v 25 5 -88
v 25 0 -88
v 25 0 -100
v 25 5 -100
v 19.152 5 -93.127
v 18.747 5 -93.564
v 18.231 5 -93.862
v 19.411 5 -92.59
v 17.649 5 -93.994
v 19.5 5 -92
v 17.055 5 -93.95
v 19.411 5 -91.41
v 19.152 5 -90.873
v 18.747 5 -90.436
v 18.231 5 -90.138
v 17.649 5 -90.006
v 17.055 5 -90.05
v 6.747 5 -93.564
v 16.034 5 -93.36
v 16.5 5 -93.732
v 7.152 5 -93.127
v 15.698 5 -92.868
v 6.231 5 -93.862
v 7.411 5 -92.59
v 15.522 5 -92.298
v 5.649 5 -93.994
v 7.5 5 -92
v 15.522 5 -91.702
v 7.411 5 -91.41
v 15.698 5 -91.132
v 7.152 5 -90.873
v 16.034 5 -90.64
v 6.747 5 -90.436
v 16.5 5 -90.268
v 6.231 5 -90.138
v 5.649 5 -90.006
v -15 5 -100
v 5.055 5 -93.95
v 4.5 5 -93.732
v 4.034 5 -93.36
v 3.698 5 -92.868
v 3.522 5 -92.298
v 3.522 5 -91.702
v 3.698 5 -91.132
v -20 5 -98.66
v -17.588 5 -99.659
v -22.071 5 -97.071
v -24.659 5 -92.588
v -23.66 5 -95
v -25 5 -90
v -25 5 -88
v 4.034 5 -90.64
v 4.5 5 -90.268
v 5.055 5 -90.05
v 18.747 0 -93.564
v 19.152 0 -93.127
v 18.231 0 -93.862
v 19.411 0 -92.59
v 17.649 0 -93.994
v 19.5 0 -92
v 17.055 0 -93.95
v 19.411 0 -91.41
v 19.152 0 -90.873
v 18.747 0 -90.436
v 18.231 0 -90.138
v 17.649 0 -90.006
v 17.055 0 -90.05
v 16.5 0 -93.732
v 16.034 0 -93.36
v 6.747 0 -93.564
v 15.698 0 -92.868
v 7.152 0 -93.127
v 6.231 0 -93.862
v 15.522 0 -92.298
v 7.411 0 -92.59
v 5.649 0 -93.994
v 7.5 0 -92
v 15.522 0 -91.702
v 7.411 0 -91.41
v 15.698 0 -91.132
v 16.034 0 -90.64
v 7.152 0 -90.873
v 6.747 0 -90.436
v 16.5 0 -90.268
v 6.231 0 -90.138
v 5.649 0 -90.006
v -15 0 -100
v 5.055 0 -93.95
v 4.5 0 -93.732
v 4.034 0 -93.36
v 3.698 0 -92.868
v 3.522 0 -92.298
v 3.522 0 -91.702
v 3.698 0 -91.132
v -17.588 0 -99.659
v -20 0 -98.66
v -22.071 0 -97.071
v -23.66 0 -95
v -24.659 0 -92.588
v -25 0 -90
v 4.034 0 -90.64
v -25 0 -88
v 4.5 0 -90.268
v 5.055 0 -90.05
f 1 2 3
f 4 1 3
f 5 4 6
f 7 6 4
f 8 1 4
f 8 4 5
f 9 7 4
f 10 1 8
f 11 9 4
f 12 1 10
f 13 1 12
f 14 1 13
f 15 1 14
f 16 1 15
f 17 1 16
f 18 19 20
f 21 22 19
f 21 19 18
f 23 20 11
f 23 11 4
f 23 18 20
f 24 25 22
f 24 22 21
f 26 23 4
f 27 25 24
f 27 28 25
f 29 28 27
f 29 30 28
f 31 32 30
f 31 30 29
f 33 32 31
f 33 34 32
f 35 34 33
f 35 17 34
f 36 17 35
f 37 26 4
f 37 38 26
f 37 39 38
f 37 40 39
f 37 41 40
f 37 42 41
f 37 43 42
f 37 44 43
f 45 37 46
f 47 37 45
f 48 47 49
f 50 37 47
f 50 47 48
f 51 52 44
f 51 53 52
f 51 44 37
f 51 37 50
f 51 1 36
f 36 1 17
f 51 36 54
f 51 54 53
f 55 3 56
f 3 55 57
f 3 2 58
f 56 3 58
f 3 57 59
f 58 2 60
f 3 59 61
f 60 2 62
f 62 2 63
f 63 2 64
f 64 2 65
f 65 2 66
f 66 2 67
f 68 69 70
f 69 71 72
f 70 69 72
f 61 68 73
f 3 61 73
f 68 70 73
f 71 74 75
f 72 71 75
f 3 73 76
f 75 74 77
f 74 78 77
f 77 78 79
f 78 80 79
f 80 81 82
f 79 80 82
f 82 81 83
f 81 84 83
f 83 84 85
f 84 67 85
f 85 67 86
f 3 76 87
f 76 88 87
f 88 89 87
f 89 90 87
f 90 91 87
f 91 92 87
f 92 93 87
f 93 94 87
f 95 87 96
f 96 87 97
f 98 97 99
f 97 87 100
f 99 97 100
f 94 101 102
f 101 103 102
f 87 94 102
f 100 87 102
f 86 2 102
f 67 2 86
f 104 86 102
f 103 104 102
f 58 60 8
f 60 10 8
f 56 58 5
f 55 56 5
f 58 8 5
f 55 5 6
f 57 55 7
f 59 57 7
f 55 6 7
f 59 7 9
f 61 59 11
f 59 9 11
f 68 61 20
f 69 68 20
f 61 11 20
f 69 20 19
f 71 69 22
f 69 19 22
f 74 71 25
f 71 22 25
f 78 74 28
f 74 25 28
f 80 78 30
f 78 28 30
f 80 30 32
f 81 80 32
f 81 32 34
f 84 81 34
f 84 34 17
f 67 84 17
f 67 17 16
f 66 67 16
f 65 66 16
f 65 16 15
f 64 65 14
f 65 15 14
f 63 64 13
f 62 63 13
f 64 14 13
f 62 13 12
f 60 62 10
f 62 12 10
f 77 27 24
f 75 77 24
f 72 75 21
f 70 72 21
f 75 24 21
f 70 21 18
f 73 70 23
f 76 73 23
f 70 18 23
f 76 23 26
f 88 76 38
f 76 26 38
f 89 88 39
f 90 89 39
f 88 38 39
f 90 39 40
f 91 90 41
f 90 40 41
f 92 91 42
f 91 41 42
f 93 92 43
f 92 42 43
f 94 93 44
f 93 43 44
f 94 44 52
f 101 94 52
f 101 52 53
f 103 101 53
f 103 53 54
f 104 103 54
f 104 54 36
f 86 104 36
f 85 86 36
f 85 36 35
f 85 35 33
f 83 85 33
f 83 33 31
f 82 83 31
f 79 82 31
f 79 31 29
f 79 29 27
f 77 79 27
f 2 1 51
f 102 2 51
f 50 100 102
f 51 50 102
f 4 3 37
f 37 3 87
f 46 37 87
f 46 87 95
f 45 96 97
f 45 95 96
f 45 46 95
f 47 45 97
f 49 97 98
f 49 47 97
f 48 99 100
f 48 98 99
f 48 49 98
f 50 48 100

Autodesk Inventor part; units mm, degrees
ref_plane "YZ Plane" through (0, 0, 0) normal (1, 0, 0) x (0, 1, 0)
ref_plane "XZ Plane" through (0, 0, 0) normal (0, 1, 0) x (-1, 0, 0)
ref_plane "XY Plane" through (0, 0, 0) normal (0, 0, 1) x (1, 0, 0)
sketch "Sketch1" plane through (0, 0, 0) normal (0, 1, 0) x (-1, 0, 0)
  line L0 (25, 100) -> (-25, 100)
  line L1 (-25, 100) -> (-25, -100)
  line L2 (-25, -100) -> (25, -100)
  line L3 (25, -100) -> (25, 100)
  line L4 (25, 100) -> (-25, -100) construction
  line L5 (-25, 100) -> (25, -100) construction
  point P0 (0, 0)
  dimension "d0" = 200
  dimension "d1" = 50
extrude "Extrusion1" add sketch "Sketch1" along normal blind 5
sketch "Sketch2" plane through (0, 5, 0) normal (0, 1, 0) x (1, 0, 0)
  line L0 (0, 0) -> (25, 0) construction
  line L1 (25, -100) -> (25, 100) projected
  line L2 (25, -92) -> (-15.0756, -92) construction
  circle A0 centre (17.5, -92) radius 2
  circle A1 centre (5.5, -92) radius 2
  line L3 (-25, -100) -> (25, -100) projected
  circle A2 centre (17.5, 92) radius 2
  circle A3 centre (5.5, 92) radius 2
  dimension "d4" = 4
  dimension "d5" = 4
  dimension "d6" = 12
  dimension "d7" = 8
  dimension "d10" = 7.5
extrude "Extrusion2" cut sketch "Sketch2" against normal blind 5
sketch "Sketch3" plane through (0, 5, 0) normal (0, 1, 0) x (1, 0, 0)
  line L0 (19, -85) -> (31, -85)
  line L1 (31, -85) -> (31, 85)
  line L2 (31, 85) -> (19, 85)
  line L3 (19, 85) -> (19, -85)
  line L4 (25, -100) -> (25, 100) projected
  line L5 (19, -85) -> (31, 85) construction
  line L6 (31, -85) -> (19, 85) construction
  point P0 (0, 0)
  point P1 (25, 0)
  dimension "d11" = 170
  dimension "d12" = 12
extrude "Extrusion3" add sketch "Sketch3" against normal blind 5
sketch "Sketch4" plane through (0, 5, 0) normal (0, 1, 0) x (1, 0, 0)
  line L0 (25, -100) -> (25, -85) projected
  line L1 (31, 85) -> (25, 85) projected
  circle A0 centre (26, -75) radius 2
  line L2 (25, -85) -> (31, -85) projected
  line L3 (31, -85) -> (31, 85) projected
  point P0 (0, 0)
  dimension "d15" = 4
  dimension "d16" = 10
  dimension "d17" = 5
extrude "Extrusion4" cut sketch "Sketch4" against normal blind 5
pattern_linear "Rectangular Pattern1" count 6 spacing 30 along (0, 0, -1) of "Extrusion4"
fillet "Fillet1" radius 10 2 edges at (-25, 2.5, -100) (-25, 2.5, 100)
sketch "Sketch5" plane through (0, 5, 0) normal (0, 1, 0) x (1, 0, 0)
  line L0 (29.0333, 88) -> (31, 85)
  line L1 (29.0333, 88) -> (-29, 88)
  line L2 (-29, 88) -> (-29, -105)
  line L3 (-29, -105) -> (31, -105)
  line L4 (31, -105) -> (31, 85)
  line L5 (25, 100) -> (-15, 100) projected
  point P0 (0, 0)
  point P1 (25, 85)
  dimension "d26" = 12
extrude "Extrusion5" cut sketch "Sketch5" against normal blind 10
properties part number "Comb3"
